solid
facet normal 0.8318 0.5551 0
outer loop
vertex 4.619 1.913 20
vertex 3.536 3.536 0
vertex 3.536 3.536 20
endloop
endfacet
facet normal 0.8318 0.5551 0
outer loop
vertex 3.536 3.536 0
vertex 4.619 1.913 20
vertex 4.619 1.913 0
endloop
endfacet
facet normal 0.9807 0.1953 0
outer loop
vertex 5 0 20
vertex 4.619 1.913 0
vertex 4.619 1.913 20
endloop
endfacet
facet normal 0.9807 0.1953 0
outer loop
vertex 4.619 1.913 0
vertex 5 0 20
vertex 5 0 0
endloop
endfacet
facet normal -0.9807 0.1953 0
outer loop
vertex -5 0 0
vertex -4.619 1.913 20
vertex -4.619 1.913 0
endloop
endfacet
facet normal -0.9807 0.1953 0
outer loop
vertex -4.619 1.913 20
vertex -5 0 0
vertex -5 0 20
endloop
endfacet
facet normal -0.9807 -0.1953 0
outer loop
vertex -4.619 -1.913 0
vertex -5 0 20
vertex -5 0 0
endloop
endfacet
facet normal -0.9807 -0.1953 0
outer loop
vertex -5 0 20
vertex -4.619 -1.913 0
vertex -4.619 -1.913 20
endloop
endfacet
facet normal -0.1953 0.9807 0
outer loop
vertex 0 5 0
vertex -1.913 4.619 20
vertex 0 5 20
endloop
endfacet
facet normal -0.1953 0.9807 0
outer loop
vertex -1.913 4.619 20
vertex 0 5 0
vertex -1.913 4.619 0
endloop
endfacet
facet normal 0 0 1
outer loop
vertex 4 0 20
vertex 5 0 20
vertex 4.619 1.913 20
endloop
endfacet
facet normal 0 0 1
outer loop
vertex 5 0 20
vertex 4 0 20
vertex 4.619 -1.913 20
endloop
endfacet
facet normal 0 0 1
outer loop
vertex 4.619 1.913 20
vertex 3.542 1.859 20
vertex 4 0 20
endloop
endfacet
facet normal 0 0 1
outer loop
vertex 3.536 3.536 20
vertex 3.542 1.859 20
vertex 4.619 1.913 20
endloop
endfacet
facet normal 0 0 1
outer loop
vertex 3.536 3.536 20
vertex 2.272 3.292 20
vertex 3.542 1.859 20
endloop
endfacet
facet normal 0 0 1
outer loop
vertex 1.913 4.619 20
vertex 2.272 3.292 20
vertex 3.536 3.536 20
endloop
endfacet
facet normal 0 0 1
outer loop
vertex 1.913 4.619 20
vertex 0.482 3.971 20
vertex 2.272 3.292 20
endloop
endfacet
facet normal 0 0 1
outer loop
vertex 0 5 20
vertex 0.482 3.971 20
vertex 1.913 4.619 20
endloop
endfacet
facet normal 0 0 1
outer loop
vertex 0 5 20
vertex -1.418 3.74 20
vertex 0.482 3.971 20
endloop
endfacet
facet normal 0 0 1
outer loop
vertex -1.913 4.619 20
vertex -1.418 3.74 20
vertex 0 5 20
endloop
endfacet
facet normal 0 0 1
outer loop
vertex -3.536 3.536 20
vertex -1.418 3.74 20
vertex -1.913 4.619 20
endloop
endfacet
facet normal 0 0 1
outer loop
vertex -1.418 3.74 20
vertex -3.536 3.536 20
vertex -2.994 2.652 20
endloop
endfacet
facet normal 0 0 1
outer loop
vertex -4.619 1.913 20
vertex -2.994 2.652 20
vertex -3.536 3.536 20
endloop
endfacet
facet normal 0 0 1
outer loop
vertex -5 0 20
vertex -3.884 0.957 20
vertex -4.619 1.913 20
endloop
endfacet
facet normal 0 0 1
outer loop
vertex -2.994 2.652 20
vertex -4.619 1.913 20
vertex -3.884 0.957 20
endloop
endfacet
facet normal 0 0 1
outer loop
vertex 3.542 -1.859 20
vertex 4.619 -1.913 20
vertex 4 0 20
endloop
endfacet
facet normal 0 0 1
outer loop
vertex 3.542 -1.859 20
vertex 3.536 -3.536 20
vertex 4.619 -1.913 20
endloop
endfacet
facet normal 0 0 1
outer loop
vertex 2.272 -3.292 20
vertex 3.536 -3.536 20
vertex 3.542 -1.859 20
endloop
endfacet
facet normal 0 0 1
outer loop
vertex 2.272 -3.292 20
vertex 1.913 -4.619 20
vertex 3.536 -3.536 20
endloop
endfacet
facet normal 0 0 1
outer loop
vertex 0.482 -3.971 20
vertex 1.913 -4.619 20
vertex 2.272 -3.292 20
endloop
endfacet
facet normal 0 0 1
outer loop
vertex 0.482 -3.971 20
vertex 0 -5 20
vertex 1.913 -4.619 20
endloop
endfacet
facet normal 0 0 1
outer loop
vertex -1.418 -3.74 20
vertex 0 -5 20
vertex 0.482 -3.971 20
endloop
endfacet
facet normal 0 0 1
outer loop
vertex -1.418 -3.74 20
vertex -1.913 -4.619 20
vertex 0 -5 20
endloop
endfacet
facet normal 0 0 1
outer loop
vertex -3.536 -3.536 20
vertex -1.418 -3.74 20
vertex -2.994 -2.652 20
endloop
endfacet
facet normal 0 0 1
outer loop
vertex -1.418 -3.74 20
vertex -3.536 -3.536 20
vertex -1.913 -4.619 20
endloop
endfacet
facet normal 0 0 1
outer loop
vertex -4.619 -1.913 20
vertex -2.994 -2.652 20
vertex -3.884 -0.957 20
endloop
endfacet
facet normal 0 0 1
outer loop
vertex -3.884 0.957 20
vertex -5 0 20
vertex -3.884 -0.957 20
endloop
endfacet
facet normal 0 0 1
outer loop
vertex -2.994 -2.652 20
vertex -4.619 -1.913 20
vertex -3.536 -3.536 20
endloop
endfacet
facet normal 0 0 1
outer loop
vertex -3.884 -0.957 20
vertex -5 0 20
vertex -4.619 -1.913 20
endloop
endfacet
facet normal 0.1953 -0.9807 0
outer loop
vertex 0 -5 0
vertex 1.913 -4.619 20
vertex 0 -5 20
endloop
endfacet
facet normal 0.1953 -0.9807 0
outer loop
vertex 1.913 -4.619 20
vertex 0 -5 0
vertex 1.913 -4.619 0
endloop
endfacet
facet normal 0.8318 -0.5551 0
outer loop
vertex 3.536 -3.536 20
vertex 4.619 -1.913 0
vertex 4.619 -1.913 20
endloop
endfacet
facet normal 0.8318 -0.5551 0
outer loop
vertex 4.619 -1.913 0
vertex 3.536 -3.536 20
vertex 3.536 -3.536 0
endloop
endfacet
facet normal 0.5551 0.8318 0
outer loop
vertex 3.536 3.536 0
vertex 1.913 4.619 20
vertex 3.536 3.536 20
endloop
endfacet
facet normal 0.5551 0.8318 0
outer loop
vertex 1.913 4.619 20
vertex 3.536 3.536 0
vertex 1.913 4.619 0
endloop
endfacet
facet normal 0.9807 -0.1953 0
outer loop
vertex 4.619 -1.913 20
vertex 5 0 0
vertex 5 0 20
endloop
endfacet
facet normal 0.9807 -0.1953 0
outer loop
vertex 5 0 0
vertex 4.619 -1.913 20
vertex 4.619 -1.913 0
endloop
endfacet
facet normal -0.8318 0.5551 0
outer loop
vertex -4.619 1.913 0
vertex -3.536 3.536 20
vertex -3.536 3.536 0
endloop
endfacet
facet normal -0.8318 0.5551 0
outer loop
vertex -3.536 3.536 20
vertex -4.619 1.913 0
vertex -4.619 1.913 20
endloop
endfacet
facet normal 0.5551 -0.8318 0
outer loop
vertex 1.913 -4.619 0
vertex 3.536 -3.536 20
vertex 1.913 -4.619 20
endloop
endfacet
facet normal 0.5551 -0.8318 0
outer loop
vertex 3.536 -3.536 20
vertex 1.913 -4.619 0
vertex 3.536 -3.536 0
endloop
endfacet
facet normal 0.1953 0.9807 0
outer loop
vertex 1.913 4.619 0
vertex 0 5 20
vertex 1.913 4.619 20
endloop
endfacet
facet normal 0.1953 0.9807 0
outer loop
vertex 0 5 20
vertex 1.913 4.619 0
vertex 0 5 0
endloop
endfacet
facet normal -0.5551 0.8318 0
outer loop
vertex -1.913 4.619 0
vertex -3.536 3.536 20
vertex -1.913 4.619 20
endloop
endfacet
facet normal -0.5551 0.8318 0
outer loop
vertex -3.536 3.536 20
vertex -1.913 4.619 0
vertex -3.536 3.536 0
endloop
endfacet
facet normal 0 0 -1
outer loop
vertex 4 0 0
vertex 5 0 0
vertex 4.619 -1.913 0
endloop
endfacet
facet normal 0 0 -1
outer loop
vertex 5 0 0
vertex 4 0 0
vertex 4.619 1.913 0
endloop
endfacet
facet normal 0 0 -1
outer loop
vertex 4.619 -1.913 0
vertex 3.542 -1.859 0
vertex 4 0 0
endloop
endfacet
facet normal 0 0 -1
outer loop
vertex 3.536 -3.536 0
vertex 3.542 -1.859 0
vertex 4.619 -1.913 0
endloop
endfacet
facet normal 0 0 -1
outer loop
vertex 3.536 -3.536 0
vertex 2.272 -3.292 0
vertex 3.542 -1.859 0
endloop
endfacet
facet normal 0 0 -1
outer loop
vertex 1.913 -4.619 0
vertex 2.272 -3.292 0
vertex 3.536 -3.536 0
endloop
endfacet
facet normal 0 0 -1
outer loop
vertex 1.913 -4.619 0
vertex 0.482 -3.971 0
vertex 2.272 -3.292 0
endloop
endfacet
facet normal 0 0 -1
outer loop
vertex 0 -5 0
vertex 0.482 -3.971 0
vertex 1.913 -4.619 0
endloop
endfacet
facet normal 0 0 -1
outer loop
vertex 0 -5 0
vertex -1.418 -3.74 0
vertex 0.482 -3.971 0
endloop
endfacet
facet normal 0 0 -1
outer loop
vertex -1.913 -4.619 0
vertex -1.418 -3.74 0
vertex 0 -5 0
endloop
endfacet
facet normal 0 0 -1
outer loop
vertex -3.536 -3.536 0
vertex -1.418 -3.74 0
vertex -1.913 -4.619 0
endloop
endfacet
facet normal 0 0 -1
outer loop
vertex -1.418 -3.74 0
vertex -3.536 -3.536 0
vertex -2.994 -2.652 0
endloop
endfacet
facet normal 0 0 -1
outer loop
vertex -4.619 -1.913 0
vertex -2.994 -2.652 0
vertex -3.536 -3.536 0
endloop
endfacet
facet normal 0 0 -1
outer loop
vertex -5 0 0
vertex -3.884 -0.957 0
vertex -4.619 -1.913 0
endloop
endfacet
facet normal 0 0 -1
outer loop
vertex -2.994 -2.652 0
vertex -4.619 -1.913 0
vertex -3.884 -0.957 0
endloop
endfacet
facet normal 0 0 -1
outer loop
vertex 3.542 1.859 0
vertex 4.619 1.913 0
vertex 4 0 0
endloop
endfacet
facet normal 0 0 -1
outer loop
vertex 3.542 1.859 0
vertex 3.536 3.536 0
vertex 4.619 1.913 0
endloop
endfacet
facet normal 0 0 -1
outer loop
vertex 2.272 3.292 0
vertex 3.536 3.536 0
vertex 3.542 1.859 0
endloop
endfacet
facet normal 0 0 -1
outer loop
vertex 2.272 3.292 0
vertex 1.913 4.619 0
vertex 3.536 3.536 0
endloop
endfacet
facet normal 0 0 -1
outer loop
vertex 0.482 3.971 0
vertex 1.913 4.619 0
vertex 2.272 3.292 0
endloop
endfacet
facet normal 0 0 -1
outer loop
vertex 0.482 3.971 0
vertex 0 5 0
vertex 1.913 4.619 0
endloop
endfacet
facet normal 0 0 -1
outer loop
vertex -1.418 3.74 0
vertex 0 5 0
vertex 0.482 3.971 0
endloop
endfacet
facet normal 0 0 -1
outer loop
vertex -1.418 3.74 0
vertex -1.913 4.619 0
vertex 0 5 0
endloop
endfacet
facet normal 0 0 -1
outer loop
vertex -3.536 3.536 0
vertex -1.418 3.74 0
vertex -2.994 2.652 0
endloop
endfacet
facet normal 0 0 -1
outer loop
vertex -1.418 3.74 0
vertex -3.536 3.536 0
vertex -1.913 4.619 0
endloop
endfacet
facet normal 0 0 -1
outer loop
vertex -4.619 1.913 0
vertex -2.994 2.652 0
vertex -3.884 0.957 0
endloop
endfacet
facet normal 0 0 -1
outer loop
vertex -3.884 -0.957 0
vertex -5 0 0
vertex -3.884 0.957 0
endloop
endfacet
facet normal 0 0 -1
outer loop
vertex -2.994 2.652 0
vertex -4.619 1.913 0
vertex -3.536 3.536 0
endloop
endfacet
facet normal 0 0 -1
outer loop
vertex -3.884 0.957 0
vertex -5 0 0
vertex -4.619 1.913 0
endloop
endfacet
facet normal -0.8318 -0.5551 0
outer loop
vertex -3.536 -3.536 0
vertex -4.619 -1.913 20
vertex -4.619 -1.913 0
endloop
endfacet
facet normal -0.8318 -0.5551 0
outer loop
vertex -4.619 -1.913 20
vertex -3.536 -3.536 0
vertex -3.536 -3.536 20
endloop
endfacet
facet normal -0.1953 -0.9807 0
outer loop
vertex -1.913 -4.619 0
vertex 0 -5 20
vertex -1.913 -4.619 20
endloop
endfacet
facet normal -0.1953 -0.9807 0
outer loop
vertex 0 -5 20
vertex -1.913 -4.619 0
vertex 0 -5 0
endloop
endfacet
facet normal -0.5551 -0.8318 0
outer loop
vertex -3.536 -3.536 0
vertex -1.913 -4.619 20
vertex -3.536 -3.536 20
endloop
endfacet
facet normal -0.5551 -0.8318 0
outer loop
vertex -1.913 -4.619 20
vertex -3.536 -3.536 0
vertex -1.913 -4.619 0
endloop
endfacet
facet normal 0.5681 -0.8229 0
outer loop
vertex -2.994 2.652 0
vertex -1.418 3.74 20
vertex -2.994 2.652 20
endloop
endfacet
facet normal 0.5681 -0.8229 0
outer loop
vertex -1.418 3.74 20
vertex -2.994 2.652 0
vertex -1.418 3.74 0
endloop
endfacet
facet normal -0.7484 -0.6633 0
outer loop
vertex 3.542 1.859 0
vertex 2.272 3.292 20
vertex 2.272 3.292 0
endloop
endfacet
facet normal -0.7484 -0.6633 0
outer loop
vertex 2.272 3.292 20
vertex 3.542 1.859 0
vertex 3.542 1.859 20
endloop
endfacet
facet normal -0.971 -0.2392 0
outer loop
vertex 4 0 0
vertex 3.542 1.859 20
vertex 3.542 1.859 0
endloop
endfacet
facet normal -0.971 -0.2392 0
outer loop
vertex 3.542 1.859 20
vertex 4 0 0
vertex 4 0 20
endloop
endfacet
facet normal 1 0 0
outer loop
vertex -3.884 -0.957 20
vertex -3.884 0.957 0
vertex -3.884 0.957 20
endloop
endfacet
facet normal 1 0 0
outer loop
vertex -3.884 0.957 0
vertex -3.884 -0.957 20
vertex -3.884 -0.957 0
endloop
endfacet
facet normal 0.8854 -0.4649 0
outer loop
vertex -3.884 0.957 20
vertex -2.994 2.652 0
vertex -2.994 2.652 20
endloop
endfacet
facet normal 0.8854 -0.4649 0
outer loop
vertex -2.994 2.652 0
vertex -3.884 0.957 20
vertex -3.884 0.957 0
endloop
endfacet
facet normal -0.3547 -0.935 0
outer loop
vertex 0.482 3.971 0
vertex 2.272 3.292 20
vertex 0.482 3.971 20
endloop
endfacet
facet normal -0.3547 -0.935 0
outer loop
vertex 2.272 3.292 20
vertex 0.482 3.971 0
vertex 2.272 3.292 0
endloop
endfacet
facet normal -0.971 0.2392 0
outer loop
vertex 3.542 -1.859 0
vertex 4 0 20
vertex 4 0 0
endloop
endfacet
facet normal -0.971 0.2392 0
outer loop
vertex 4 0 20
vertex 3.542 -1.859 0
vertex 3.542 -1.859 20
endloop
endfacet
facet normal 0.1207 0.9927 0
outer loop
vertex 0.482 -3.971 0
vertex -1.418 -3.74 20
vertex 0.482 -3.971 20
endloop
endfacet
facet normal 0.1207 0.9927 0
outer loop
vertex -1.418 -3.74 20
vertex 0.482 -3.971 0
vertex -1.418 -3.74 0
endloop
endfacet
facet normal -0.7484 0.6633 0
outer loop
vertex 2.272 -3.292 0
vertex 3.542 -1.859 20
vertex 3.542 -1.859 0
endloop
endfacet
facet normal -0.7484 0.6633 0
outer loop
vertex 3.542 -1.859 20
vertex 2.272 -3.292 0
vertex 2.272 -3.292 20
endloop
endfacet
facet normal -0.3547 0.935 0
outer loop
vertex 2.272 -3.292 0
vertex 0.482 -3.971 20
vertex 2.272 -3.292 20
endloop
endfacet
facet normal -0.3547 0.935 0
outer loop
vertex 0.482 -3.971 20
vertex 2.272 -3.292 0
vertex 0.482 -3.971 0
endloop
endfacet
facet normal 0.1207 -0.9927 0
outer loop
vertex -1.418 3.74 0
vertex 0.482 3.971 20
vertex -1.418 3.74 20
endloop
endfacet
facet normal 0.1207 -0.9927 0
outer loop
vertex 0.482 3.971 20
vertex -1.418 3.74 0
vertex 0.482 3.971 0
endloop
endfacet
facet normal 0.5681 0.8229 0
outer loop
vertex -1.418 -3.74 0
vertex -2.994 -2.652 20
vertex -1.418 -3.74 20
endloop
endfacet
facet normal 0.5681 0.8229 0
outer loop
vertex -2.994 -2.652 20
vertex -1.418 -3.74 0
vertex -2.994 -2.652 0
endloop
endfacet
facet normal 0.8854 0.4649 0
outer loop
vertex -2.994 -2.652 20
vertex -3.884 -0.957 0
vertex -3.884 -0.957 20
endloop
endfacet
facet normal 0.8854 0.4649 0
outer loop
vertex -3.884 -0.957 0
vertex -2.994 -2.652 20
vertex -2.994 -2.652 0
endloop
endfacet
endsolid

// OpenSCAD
pipe(10,8,20);


module pipe(dExt,dInt,length) {
    difference() {
        cylinder(d=dExt,length);
        cylinder(d=dInt,length);
    };
}
